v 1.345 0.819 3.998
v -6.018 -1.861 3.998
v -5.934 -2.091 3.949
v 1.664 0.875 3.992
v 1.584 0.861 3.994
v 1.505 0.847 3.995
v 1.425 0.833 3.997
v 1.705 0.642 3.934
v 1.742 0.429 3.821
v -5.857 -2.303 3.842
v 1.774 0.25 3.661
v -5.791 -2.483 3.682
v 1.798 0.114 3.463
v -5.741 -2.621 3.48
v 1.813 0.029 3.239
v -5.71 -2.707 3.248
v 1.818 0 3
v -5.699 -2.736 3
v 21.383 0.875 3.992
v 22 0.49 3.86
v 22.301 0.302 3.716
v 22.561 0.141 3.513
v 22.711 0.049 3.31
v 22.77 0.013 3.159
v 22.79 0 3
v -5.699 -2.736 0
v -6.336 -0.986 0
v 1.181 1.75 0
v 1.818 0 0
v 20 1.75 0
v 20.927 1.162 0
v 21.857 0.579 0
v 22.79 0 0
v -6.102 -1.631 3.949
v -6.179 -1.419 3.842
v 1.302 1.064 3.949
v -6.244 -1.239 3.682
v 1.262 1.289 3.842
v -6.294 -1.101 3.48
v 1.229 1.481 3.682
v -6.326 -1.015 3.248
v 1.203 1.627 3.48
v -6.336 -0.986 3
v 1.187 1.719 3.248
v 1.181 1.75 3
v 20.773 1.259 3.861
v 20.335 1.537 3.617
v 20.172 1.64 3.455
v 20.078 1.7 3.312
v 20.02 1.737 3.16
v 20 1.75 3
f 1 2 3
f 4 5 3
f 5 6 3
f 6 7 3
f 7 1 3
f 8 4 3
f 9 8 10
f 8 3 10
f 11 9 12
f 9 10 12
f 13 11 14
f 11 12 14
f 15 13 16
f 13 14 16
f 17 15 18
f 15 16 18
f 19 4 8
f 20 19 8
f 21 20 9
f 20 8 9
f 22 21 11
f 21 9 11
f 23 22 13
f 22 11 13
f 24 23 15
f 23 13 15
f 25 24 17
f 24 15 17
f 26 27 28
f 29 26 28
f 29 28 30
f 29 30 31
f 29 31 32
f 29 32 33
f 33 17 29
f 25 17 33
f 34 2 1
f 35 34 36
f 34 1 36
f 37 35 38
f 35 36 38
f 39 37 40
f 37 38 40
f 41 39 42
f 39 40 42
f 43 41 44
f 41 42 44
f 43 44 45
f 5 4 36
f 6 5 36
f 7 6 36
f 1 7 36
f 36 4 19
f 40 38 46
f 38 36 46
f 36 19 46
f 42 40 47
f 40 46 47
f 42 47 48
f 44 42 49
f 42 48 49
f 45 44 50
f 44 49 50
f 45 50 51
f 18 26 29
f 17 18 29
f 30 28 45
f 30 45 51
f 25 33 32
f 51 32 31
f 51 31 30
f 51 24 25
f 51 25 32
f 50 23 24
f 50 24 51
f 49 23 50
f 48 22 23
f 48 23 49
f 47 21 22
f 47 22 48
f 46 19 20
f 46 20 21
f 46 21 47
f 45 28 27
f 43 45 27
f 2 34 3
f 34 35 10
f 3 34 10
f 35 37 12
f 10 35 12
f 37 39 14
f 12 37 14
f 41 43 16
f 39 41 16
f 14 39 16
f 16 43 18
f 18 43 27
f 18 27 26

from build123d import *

# Parameters (mm, degrees)
SKETCH_1_W          = 20
SKETCH_1_H          = 4
EXTRUDE_1_DEPTH     = 1.75
EXTRUDE_2_DEPTH     = 4
EXTRUDE_3_DEPTH     = 4
CUT_EXTRUDE_1_DEPTH = 24.299797316
FILLET_4_R          = 1


with BuildPart() as part:
    # 草图1 → 凸台-拉伸1 (new body)
    with BuildSketch(Plane(origin=(0, 0, 0), x_dir=(1, 0, 0), z_dir=(0, 1, 0))):
        with Locations((10, -2)):
            Rectangle(SKETCH_1_W, SKETCH_1_H)
    extrude(amount=EXTRUDE_1_DEPTH)

    # 草图6 → 凸台-拉伸2 (add)
    with BuildSketch(Plane.XY.offset(4)):
        with BuildLine():
            Line((20, 0), (22.790216698, 0))
            ThreePointArc((22.790216698, 0), (21.391749441, 0.869644524), (20, 1.75))
            Line((20, 1.75), (20, 0))
        make_face()
    extrude(amount=-EXTRUDE_2_DEPTH)

    # 草图7 → 凸台-拉伸3 (add)
    with BuildSketch(Plane(origin=(0, 0, 0), x_dir=(-1, 0, 0), z_dir=(0, 0, -1))):
        Polygon((5.699396556, -2.736161147), (-1.818144411, 0), (-1.181196501, 1.75), (6.336344466, -0.986161147), align=None)
    extrude(amount=-EXTRUDE_3_DEPTH)

    # 草图8 → 切除-拉伸1 (cut, through all)
    with BuildSketch(Plane.XY.offset(4)):
        Polygon((1.181196501, 1.75), (-6.336344466, -0.986161147), (0, 1.75), align=None)
    extrude(amount=-CUT_EXTRUDE_1_DEPTH, mode=Mode.SUBTRACT)

    # 圆角4
    # the kernel refuses this fillet: 1 mm, written as the material it takes off along each edge
    with BuildSketch(Plane(origin=(-8.048628108, -3.591211505, 4), x_dir=(-0.3420201433256633, 0.9396926207859104, 0), z_dir=(0.9396926207859104, 0.3420201433256633, 0))) as fillet_4_piece_1_section:
        with BuildLine():
            CenterArc((FILLET_4_R, -FILLET_4_R), FILLET_4_R, 90, 90)
            Line((0, -FILLET_4_R), (0, 0))
            Line((0, 0), (FILLET_4_R, 0))
        make_face()
    fillet_4_piece_1 = extrude(amount=13, mode=Mode.PRIVATE)
    fillet_4_piece_1 = fillet_4_piece_1 - Plane(origin=(-8.048628108, 1, 3), x_dir=(0, 0, 1), z_dir=(-1, 0, 0)) * Cylinder(1, 31, mode=Mode.PRIVATE)
    add(fillet_4_piece_1, mode=Mode.SUBTRACT)
    with BuildSketch(Plane(origin=(-0.681855589, 0, 4), x_dir=(0, 1, 0), z_dir=(1, 0, 0))) as fillet_4_piece_2_section:
        with BuildLine():
            CenterArc((FILLET_4_R, -FILLET_4_R), FILLET_4_R, 90, 90)
            Line((0, -FILLET_4_R), (0, 0))
            Line((0, 0), (FILLET_4_R, 0))
        make_face()
    fillet_4_piece_2 = extrude(amount=25.972072288, mode=Mode.PRIVATE)
    fillet_4_piece_2 = fillet_4_piece_2 - Plane(origin=(-0.731431287, 0.136208109, 3), x_dir=(0, 0, 1), z_dir=(-0.9396926207859104, -0.3420201433256633, 0)) * Cylinder(1, 56, mode=Mode.PRIVATE)
    add(fillet_4_piece_2, mode=Mode.SUBTRACT)
    with BuildSketch(Plane(origin=(5.174890139, 3.203585609, 4), x_dir=(0.34202014332566305, -0.9396926207859104, 0), z_dir=(-0.9396926207859105, -0.3420201433256631, 0))) as fillet_4_piece_3:
        with BuildLine():
            CenterArc((FILLET_4_R, -FILLET_4_R), FILLET_4_R, 90, 90)
            Line((0, -FILLET_4_R), (0, 0))
            Line((0, 0), (FILLET_4_R, 0))
        make_face()
    extrude(amount=14.75, mode=Mode.SUBTRACT)
    with BuildSketch(Plane(origin=(22.5, 1.75, 4), x_dir=(0, -1, 0), z_dir=(-1, 0, 0))) as fillet_4_piece_4:
        with BuildLine():
            CenterArc((FILLET_4_R, -FILLET_4_R), FILLET_4_R, 90, 90)
            Line((0, -FILLET_4_R), (0, 0))
            Line((0, 0), (FILLET_4_R, 0))
        make_face()
    extrude(amount=25.568803499, mode=Mode.SUBTRACT)


solid = part.part
